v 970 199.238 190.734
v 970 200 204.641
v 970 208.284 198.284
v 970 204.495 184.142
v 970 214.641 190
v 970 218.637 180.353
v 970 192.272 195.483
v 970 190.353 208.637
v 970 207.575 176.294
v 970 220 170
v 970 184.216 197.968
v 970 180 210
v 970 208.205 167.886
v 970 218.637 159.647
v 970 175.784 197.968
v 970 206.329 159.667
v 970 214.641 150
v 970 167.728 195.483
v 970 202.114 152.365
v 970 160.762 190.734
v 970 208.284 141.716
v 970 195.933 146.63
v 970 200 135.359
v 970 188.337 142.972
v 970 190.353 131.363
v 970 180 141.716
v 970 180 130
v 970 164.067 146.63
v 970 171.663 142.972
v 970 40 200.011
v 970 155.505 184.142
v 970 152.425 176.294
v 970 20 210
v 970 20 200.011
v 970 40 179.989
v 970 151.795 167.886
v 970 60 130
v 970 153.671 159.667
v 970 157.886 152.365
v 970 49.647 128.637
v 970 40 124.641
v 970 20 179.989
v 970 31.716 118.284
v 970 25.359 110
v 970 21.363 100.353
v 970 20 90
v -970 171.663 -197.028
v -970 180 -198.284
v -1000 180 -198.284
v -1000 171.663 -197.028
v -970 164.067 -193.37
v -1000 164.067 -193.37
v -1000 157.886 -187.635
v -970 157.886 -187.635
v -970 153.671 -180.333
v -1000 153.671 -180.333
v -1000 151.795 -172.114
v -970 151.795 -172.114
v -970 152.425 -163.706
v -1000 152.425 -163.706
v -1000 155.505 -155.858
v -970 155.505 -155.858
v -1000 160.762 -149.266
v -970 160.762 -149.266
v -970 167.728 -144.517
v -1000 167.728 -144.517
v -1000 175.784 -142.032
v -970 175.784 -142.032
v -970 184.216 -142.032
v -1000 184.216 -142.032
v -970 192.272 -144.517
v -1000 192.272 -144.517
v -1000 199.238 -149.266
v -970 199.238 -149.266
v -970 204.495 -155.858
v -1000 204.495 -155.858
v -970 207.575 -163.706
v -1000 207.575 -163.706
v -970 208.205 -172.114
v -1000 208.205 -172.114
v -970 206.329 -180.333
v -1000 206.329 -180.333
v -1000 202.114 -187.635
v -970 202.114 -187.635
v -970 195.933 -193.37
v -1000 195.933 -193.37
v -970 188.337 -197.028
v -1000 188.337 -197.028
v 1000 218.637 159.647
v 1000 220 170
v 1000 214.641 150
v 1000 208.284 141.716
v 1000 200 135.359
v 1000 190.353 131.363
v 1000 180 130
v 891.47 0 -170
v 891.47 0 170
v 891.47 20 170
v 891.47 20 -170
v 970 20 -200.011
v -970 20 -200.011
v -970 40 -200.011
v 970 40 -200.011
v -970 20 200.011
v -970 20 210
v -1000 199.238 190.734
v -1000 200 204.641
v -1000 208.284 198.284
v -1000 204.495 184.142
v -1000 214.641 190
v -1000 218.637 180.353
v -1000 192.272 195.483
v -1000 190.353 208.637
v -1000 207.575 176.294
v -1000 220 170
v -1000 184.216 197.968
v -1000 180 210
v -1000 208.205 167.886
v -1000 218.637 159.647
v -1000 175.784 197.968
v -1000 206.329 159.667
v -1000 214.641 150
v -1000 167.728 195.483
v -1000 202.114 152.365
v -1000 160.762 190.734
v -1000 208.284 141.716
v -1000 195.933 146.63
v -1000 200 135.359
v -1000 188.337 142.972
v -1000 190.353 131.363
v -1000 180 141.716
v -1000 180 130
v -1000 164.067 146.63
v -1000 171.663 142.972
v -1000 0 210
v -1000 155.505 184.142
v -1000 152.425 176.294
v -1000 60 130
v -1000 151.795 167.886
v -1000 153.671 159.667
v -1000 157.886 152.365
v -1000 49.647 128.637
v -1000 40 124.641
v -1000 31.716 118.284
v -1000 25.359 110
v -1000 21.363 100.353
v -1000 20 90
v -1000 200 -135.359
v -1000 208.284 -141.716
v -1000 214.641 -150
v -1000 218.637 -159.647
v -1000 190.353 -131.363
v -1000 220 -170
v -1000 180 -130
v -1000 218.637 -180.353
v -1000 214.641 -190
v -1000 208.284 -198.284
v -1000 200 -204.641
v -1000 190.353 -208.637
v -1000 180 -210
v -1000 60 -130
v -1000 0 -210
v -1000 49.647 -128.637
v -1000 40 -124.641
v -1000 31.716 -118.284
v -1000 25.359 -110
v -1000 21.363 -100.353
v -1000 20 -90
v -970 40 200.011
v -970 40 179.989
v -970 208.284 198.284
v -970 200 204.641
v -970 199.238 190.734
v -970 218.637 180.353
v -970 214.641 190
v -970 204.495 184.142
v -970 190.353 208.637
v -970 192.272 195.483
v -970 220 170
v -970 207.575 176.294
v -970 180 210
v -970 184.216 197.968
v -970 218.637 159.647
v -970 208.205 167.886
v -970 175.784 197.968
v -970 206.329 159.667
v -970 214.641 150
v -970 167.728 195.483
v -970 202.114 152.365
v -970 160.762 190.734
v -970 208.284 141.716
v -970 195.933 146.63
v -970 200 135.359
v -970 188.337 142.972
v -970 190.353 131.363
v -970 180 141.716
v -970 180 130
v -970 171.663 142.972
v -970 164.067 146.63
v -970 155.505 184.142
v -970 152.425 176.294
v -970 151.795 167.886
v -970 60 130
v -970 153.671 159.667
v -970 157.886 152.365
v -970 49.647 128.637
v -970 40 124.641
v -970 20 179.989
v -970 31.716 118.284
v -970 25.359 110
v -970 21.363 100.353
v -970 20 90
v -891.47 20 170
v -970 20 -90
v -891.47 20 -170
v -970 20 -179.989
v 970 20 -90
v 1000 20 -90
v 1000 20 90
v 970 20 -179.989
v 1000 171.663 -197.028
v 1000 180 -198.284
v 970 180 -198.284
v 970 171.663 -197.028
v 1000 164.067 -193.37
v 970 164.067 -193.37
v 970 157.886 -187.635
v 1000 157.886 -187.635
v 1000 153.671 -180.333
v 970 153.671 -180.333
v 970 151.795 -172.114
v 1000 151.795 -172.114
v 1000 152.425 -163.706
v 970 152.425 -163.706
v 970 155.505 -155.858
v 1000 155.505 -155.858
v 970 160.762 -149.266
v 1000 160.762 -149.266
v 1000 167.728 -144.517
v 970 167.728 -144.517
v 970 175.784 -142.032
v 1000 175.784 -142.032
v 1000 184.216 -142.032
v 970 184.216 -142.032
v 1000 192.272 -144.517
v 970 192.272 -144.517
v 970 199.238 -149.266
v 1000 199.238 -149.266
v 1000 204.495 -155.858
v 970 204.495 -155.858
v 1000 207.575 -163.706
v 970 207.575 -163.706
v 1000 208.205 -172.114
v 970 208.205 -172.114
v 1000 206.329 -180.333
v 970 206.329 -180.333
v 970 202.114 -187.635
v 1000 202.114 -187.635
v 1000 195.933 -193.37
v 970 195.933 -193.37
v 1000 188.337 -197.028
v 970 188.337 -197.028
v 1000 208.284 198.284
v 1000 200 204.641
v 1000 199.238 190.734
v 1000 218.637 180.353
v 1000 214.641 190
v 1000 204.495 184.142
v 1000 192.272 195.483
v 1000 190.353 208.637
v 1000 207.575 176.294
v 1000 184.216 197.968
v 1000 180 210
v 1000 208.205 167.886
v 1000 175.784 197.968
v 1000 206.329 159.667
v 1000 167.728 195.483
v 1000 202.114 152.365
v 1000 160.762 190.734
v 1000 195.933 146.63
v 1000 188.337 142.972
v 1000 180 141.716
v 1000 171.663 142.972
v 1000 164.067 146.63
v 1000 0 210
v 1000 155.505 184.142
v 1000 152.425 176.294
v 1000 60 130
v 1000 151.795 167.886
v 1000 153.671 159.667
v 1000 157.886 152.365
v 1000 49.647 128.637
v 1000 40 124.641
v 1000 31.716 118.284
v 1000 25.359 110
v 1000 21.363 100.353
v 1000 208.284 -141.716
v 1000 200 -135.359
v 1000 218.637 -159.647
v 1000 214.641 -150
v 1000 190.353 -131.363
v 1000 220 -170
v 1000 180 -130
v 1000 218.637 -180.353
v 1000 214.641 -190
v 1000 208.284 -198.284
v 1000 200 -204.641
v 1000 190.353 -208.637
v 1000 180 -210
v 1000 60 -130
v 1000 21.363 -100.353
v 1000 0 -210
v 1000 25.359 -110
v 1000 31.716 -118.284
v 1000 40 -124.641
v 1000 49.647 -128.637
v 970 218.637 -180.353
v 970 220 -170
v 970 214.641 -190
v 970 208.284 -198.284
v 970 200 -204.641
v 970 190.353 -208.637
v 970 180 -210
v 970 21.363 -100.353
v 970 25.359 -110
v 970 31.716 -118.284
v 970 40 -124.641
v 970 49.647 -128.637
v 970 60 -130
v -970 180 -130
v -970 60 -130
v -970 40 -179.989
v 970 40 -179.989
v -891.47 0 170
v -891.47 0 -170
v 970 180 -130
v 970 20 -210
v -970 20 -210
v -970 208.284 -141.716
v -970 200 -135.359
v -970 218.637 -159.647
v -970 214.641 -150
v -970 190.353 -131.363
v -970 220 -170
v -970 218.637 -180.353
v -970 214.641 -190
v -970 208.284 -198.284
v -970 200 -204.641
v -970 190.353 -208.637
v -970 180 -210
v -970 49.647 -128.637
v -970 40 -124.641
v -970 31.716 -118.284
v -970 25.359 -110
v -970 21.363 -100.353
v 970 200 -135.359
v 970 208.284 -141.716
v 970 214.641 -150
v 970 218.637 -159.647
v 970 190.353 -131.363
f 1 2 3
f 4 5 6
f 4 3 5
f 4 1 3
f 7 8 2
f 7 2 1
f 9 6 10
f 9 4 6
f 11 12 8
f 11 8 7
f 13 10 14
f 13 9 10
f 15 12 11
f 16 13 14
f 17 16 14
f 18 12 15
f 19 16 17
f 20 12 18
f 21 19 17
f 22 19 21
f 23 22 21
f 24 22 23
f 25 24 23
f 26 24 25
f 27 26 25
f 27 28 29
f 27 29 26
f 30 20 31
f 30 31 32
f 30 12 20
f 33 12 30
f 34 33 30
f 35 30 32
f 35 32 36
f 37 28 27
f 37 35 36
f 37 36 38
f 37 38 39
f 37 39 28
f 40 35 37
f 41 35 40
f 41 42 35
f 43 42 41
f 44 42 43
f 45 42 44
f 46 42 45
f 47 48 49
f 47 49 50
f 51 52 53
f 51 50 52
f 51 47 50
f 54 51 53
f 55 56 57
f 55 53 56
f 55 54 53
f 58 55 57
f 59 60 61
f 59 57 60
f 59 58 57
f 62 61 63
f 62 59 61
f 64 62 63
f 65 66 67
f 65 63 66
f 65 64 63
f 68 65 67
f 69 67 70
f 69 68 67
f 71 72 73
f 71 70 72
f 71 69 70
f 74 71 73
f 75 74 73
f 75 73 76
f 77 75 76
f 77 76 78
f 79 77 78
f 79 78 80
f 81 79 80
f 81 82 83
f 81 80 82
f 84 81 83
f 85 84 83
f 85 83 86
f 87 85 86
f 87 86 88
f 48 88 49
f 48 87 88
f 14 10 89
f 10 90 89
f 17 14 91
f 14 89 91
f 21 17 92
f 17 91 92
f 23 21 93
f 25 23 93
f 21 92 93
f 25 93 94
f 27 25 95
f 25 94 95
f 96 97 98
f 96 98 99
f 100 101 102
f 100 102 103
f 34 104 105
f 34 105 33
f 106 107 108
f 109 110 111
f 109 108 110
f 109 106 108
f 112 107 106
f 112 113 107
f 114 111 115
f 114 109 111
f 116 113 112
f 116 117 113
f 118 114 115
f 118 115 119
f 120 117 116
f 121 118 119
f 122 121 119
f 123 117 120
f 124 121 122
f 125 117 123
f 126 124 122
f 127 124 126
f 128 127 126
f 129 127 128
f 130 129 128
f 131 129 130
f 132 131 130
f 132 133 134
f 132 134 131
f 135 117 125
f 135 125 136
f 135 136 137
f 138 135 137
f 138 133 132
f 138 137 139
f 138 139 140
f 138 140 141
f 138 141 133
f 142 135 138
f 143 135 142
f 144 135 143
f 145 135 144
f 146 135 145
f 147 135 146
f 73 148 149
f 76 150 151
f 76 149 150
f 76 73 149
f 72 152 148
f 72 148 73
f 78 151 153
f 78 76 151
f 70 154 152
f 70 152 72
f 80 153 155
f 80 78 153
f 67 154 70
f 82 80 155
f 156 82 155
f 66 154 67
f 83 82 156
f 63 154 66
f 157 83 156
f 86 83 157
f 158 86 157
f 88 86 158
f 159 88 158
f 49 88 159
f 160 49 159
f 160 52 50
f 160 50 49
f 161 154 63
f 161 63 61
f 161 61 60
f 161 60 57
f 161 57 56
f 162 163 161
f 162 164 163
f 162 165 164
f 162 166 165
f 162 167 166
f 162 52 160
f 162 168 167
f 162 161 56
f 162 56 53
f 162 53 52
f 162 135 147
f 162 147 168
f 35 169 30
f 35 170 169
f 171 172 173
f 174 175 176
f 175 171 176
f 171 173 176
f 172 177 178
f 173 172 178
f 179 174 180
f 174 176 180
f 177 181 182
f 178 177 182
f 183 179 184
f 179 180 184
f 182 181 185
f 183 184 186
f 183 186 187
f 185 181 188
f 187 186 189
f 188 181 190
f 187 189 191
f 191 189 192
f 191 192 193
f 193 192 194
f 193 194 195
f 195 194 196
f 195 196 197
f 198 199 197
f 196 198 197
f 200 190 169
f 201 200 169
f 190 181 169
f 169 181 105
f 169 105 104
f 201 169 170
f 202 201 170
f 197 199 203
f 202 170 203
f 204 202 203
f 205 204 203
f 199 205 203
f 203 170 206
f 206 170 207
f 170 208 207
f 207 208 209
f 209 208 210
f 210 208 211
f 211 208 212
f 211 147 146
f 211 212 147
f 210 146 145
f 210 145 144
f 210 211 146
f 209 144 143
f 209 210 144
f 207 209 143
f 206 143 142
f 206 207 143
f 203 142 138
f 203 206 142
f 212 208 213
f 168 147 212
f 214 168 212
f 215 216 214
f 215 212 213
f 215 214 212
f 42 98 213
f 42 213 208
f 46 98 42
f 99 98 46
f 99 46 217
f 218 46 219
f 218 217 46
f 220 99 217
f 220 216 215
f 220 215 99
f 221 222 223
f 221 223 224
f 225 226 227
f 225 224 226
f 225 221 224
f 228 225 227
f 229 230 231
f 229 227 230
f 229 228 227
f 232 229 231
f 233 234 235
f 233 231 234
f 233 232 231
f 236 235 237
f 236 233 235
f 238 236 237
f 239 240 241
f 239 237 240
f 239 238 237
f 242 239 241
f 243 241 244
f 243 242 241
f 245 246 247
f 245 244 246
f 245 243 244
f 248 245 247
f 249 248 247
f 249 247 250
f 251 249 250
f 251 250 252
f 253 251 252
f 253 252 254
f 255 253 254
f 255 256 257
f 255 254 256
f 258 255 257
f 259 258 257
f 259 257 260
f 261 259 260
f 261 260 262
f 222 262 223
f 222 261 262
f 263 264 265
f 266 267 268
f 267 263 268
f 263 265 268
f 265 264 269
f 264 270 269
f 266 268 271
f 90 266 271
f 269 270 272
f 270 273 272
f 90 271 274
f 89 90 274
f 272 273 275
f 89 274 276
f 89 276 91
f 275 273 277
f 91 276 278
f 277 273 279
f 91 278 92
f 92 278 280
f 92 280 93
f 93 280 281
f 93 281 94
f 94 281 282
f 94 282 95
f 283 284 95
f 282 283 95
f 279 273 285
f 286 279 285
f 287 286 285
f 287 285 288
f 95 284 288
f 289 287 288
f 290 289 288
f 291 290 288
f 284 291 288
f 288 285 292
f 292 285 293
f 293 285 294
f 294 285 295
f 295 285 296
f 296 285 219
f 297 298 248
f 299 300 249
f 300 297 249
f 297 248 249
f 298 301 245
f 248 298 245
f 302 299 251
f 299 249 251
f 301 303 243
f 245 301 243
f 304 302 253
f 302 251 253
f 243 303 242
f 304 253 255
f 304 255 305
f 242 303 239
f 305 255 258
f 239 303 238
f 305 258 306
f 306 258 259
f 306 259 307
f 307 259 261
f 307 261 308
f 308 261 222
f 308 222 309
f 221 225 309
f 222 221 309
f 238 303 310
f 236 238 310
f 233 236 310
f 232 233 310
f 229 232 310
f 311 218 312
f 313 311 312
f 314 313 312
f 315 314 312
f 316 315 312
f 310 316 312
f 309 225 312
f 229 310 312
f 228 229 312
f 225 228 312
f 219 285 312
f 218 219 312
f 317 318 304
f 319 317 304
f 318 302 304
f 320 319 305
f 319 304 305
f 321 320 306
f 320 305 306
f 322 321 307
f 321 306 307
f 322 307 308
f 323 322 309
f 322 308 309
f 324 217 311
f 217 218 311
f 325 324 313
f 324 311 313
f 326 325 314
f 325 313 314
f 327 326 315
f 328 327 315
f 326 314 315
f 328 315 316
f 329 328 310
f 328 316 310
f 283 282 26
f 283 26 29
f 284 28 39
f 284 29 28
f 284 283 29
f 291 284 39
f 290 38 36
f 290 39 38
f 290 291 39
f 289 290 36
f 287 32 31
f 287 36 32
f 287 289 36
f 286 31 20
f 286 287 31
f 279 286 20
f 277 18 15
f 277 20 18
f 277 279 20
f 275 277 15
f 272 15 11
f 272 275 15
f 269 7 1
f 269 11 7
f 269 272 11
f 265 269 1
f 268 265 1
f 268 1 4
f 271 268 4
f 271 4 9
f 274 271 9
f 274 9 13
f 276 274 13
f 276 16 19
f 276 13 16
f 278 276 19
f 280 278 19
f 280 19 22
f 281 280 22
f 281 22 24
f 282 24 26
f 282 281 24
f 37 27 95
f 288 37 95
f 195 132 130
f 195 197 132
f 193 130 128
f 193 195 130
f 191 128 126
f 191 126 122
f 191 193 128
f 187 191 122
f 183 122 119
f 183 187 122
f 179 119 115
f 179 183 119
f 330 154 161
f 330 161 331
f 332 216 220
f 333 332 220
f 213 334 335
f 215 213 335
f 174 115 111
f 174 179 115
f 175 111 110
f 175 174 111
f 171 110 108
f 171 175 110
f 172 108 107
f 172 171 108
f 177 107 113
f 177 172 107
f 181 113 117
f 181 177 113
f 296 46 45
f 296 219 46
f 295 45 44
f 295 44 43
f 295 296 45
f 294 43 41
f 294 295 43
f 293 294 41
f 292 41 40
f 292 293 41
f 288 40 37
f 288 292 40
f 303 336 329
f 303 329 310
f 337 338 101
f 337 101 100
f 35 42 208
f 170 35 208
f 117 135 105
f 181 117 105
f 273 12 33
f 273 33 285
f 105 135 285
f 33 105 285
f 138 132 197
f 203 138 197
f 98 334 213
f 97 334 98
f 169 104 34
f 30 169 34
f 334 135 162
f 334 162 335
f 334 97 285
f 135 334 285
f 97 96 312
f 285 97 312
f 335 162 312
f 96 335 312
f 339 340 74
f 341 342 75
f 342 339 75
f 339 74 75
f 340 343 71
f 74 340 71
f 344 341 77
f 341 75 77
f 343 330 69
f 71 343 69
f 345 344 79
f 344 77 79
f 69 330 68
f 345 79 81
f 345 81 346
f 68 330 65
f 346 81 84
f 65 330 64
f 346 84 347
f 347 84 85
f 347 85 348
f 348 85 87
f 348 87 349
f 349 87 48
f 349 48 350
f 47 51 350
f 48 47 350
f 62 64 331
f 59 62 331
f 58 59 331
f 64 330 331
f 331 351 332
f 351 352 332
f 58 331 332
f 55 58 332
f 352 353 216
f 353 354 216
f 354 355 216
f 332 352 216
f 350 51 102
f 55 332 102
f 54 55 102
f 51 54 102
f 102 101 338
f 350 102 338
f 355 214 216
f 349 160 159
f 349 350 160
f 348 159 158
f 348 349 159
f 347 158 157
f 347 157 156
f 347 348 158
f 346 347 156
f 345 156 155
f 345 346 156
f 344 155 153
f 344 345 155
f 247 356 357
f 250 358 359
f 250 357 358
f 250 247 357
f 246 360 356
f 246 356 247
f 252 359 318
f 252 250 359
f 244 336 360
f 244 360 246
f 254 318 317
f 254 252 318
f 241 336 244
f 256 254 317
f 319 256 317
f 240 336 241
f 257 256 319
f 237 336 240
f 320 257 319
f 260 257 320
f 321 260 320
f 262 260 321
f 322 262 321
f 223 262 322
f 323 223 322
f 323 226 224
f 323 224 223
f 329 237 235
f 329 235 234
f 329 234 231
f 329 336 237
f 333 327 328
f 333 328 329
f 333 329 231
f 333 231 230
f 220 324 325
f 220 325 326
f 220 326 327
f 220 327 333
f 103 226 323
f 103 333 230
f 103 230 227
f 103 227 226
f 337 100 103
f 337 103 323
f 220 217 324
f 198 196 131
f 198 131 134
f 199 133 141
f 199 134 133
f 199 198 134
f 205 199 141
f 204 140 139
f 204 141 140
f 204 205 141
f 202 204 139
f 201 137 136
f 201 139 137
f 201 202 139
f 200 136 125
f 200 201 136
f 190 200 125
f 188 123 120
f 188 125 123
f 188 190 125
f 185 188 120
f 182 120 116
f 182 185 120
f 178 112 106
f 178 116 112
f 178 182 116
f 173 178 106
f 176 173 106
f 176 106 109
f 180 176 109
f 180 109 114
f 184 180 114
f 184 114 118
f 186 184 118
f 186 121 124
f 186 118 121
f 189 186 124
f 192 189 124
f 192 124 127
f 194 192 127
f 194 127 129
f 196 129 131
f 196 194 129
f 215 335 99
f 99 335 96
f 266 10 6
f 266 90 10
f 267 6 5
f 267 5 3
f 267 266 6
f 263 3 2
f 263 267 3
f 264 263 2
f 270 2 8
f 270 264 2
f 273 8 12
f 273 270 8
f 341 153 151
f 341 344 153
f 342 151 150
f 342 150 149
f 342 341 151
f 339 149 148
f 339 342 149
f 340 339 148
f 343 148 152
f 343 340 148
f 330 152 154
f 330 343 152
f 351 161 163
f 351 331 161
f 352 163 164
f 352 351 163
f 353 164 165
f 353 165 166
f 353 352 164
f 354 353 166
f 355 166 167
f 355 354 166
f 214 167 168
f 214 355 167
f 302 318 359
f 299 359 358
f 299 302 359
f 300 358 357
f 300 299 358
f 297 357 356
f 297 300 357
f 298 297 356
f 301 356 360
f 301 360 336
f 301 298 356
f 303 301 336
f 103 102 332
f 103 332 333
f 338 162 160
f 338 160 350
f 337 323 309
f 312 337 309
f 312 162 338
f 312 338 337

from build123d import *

# Parameters (mm, degrees)
SKETCH1_W               = 2000
SKETCH1_H               = 420
SKETCH1_W_2             = 1782.939992392
SKETCH1_H_2             = 340
BOSS_EXTRUDE1_DEPTH     = 20
SKETCH3_W               = 30
SKETCH3_H               = 80
BOSS_EXTRUDE2_DEPTH     = 200
FILLET1_R               = 40
FILLET2_R               = 40
SKETCH5_W               = 972.378142936
SKETCH5_H               = 20.021799472
SKETCH5_W_2             = 1944.756285872
BOSS_EXTRUDE5_DEPTH     = 20
CUT_EXTRUDE3_DEPTH      = 2088
CUT_EXTRUDE3_DEPTH_BACK = 85
SKETCH9_R               = 28.284271247


with BuildPart() as part:
    # Sketch1 → Boss-Extrude1 (new body)
    with BuildSketch(Plane(origin=(0, 0, 0), x_dir=(1, 0, 0), z_dir=(0, 1, 0))):
        Rectangle(SKETCH1_W, SKETCH1_H)
        Rectangle(SKETCH1_W_2, SKETCH1_H_2, mode=Mode.SUBTRACT)
    extrude(amount=BOSS_EXTRUDE1_DEPTH)

    # Sketch3 → Boss-Extrude2 (add)
    with BuildSketch(Plane(origin=(0, 20, 0), x_dir=(1, 0, 0), z_dir=(0, 1, 0))):
        with Locations((-985, 170)):
            Rectangle(SKETCH3_W, SKETCH3_H)
        with Locations((985, -170)):
            Rectangle(SKETCH3_W, SKETCH3_H)
        with Locations((985, 170)):
            Rectangle(SKETCH3_W, SKETCH3_H)
        with Locations((-985, -170)):
            Rectangle(SKETCH3_W, SKETCH3_H)
    extrude(amount=BOSS_EXTRUDE2_DEPTH)

    # Fillet1
    fillet1_edges = [part.edges().sort_by_distance(p)[0] for p in [
        (-985, 220, -210),
        (-985, 220, -130),
        (-985, 220, 130),
        (-985, 220, 210),
        (985, 220, -210),
        (985, 220, -130),
        (985, 220, 130),
        (985, 220, 210),
    ]]
    fillet(fillet1_edges, radius=FILLET1_R - 0.0001)  # a hair under: the kernel refuses the full size

    # Fillet2
    fillet2_edges = [part.edges().sort_by_distance(p)[0] for p in [
        (985, 20, 130),
        (985, 20, -130),
        (-985, 20, -130),
        (-985, 20, 130),
    ]]
    fillet(fillet2_edges, radius=FILLET2_R)

    # Sketch5 → Boss-Extrude5 (add)
    with BuildSketch(Plane(origin=(0, 20, 0), x_dir=(1, 0, 0), z_dir=(0, 1, 0))):
        with Locations((486.189071468, -190)):
            Rectangle(SKETCH5_W, SKETCH5_H)
        with Locations((0, 190)):
            Rectangle(SKETCH5_W_2, SKETCH5_H)
        with Locations((-486.189071468, -190)):
            Rectangle(SKETCH5_W, SKETCH5_H)
    extrude(amount=BOSS_EXTRUDE5_DEPTH)

    # Sketch9 → Cut-Extrude3 (cut, two sides: drawn at the far end of the back side and taken through both)
    with BuildSketch(Plane.ZY.offset(-970).offset(-CUT_EXTRUDE3_DEPTH_BACK)):
        with Locations(Location((-170, 180, 0), (0, 0, 180))):
            Circle(SKETCH9_R)
        with Locations(Location((170, 180, 0), (0, 0, 180))):
            Circle(SKETCH9_R)
    extrude(amount=CUT_EXTRUDE3_DEPTH + CUT_EXTRUDE3_DEPTH_BACK, mode=Mode.SUBTRACT)


solid = part.part
